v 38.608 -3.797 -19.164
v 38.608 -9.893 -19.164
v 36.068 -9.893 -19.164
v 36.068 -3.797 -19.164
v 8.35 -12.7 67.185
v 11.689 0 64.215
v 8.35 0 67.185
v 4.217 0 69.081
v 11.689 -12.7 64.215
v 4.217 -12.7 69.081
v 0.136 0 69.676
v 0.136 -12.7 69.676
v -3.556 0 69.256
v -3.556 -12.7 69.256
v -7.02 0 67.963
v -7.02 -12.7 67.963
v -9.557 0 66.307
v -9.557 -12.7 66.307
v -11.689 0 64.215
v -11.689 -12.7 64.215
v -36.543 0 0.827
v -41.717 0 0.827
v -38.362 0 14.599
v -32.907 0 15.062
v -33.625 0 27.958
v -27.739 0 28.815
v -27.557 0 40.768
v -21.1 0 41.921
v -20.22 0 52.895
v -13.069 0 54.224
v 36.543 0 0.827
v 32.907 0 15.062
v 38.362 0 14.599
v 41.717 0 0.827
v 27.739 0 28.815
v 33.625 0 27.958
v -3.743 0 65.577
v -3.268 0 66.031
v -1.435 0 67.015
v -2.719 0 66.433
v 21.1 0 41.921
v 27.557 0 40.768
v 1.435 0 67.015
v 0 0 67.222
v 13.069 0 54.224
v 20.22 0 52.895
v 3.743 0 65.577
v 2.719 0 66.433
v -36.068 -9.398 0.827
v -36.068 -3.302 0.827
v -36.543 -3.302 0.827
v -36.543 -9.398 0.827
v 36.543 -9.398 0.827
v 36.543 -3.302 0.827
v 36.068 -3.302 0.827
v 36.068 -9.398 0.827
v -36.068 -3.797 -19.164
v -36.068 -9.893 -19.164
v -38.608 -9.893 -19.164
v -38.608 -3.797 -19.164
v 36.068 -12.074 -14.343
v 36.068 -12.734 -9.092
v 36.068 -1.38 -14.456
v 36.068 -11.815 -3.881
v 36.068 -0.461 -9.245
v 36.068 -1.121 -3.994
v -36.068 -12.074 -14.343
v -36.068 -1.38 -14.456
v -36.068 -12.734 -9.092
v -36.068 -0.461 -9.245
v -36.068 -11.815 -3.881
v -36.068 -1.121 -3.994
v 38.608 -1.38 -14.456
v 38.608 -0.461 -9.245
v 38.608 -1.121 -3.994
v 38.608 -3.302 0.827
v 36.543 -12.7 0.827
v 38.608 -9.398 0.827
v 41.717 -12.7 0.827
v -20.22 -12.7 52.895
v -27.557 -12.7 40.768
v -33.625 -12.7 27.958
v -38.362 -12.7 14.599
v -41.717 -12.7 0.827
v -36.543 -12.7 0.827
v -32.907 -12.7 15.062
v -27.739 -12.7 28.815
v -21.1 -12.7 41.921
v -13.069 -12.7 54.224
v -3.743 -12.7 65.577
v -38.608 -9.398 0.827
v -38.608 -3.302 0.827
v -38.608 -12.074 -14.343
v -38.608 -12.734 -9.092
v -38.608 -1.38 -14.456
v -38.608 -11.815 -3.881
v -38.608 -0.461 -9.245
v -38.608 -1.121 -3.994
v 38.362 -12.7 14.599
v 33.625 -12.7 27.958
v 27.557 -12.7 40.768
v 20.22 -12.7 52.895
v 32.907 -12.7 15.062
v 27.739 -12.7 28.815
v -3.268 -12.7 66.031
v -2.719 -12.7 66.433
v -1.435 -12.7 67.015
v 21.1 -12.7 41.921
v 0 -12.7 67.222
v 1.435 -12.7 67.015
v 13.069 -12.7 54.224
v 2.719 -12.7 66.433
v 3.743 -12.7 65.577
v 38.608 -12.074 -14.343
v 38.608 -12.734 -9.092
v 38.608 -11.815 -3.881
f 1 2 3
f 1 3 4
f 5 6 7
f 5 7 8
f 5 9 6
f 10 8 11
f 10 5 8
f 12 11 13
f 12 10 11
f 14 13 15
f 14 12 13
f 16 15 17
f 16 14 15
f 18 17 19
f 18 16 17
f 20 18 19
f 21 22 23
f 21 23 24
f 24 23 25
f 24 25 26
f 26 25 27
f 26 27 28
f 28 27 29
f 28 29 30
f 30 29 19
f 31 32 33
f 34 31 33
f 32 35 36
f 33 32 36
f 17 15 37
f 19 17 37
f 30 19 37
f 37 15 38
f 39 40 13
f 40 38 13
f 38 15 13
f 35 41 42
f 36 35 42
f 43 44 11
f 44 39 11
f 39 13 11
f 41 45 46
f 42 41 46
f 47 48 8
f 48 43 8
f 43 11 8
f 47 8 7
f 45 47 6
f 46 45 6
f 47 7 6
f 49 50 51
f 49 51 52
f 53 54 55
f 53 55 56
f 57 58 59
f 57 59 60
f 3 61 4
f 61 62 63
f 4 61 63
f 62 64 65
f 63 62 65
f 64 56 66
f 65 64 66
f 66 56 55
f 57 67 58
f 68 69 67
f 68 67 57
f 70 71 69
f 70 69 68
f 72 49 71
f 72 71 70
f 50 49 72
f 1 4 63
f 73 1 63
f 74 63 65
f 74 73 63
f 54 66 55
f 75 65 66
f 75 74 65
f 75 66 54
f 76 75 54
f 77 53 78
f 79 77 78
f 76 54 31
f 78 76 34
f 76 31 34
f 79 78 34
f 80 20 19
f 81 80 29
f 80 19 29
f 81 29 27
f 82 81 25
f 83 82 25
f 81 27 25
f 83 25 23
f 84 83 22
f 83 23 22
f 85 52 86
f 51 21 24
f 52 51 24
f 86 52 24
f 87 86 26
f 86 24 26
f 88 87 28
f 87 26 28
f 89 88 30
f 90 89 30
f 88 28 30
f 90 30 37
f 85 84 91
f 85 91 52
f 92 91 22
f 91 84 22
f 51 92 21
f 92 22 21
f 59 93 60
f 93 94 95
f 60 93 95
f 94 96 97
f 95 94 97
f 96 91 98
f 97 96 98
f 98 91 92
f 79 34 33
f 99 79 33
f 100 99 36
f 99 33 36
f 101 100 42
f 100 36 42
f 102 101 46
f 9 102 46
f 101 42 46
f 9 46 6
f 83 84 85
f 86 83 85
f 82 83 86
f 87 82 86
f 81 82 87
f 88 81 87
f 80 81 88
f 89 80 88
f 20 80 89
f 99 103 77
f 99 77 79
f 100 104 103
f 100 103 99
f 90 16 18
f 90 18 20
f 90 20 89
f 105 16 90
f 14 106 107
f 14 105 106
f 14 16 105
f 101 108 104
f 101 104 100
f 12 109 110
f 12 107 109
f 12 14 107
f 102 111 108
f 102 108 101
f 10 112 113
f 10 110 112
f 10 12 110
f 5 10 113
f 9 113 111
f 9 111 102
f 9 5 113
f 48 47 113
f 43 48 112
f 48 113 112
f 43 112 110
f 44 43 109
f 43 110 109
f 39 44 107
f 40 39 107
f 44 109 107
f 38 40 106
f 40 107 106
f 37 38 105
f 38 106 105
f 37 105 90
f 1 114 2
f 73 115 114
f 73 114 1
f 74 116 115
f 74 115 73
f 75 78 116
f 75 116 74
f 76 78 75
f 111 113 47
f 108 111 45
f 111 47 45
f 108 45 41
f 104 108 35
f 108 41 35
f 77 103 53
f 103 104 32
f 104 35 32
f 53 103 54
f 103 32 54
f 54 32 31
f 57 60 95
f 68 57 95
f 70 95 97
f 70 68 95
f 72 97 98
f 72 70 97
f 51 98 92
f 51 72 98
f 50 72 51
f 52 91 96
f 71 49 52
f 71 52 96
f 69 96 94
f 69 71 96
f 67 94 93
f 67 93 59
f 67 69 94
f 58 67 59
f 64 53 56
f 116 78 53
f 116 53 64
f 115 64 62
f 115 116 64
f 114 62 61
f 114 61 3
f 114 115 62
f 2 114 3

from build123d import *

# Parameters (mm, degrees)
F1_DEPTH = 12.7
F2_R     = 15.24
F3_R     = 5.08
F6_DEPTH = 1.27
F9_DEPTH = 1.27


with BuildPart() as f1:
    # F0 (on Front) → F1 (new body)
    with BuildSketch(Plane.XZ):
        with BuildLine():
            ThreePointArc((41.717369, 0.82729), (26.878905, 42.014486), (0, 76.570086))
            ThreePointArc((0, 76.570086), (-26.878905, 42.014486), (-41.717369, 0.82729))
            Line((-41.717369, 0.82729), (-36.542559, 0.82729))
            ThreePointArc((-36.542559, 0.82729), (-23.349687, 37.863578), (0, 69.494744))
            ThreePointArc((0, 69.494744), (23.349687, 37.863578), (36.542559, 0.82729))
            Line((36.542559, 0.82729), (41.717369, 0.82729))
        make_face()
    extrude(amount=F1_DEPTH)

    # F2
    f2_edges = [f1.edges().sort_by_distance(p)[0] for p in [
        (0, -6.35, 76.570086),
    ]]
    fillet(f2_edges, radius=F2_R)

    # F3
    f3_edges = [f1.edges().sort_by_distance(p)[0] for p in [
        (0, -6.35, 69.494744),
    ]]
    fillet(f3_edges, radius=F3_R)

    # F5 (on offset) → F6 (join, symmetric)
    with BuildSketch(Plane.YZ.offset(37.338)):
        with BuildLine():
            Line((-3.302, 0.82729), (-9.398, 0.82729))
            ThreePointArc((-9.398, 0.82729), (-12.734035, -9.091947), (-9.893086, -19.164158))
            Line((-9.893086, -19.164158), (-3.797086, -19.164158))
            ThreePointArc((-3.797086, -19.164158), (-0.461051, -9.24492), (-3.302, 0.82729))
        make_face()
    extrude(amount=F6_DEPTH, both=True)

    # F8 (on offset) → F9 (join, symmetric)
    with BuildSketch(Plane.YZ.offset(-37.338)):
        with BuildLine():
            Line((-3.302, 0.82729), (-9.398, 0.82729))
            ThreePointArc((-9.398, 0.82729), (-12.734035, -9.091947), (-9.893086, -19.164158))
            Line((-9.893086, -19.164158), (-3.797086, -19.164158))
            ThreePointArc((-3.797086, -19.164158), (-0.461051, -9.24492), (-3.302, 0.82729))
        make_face()
    extrude(amount=F9_DEPTH, both=True)


solid = f1.part
